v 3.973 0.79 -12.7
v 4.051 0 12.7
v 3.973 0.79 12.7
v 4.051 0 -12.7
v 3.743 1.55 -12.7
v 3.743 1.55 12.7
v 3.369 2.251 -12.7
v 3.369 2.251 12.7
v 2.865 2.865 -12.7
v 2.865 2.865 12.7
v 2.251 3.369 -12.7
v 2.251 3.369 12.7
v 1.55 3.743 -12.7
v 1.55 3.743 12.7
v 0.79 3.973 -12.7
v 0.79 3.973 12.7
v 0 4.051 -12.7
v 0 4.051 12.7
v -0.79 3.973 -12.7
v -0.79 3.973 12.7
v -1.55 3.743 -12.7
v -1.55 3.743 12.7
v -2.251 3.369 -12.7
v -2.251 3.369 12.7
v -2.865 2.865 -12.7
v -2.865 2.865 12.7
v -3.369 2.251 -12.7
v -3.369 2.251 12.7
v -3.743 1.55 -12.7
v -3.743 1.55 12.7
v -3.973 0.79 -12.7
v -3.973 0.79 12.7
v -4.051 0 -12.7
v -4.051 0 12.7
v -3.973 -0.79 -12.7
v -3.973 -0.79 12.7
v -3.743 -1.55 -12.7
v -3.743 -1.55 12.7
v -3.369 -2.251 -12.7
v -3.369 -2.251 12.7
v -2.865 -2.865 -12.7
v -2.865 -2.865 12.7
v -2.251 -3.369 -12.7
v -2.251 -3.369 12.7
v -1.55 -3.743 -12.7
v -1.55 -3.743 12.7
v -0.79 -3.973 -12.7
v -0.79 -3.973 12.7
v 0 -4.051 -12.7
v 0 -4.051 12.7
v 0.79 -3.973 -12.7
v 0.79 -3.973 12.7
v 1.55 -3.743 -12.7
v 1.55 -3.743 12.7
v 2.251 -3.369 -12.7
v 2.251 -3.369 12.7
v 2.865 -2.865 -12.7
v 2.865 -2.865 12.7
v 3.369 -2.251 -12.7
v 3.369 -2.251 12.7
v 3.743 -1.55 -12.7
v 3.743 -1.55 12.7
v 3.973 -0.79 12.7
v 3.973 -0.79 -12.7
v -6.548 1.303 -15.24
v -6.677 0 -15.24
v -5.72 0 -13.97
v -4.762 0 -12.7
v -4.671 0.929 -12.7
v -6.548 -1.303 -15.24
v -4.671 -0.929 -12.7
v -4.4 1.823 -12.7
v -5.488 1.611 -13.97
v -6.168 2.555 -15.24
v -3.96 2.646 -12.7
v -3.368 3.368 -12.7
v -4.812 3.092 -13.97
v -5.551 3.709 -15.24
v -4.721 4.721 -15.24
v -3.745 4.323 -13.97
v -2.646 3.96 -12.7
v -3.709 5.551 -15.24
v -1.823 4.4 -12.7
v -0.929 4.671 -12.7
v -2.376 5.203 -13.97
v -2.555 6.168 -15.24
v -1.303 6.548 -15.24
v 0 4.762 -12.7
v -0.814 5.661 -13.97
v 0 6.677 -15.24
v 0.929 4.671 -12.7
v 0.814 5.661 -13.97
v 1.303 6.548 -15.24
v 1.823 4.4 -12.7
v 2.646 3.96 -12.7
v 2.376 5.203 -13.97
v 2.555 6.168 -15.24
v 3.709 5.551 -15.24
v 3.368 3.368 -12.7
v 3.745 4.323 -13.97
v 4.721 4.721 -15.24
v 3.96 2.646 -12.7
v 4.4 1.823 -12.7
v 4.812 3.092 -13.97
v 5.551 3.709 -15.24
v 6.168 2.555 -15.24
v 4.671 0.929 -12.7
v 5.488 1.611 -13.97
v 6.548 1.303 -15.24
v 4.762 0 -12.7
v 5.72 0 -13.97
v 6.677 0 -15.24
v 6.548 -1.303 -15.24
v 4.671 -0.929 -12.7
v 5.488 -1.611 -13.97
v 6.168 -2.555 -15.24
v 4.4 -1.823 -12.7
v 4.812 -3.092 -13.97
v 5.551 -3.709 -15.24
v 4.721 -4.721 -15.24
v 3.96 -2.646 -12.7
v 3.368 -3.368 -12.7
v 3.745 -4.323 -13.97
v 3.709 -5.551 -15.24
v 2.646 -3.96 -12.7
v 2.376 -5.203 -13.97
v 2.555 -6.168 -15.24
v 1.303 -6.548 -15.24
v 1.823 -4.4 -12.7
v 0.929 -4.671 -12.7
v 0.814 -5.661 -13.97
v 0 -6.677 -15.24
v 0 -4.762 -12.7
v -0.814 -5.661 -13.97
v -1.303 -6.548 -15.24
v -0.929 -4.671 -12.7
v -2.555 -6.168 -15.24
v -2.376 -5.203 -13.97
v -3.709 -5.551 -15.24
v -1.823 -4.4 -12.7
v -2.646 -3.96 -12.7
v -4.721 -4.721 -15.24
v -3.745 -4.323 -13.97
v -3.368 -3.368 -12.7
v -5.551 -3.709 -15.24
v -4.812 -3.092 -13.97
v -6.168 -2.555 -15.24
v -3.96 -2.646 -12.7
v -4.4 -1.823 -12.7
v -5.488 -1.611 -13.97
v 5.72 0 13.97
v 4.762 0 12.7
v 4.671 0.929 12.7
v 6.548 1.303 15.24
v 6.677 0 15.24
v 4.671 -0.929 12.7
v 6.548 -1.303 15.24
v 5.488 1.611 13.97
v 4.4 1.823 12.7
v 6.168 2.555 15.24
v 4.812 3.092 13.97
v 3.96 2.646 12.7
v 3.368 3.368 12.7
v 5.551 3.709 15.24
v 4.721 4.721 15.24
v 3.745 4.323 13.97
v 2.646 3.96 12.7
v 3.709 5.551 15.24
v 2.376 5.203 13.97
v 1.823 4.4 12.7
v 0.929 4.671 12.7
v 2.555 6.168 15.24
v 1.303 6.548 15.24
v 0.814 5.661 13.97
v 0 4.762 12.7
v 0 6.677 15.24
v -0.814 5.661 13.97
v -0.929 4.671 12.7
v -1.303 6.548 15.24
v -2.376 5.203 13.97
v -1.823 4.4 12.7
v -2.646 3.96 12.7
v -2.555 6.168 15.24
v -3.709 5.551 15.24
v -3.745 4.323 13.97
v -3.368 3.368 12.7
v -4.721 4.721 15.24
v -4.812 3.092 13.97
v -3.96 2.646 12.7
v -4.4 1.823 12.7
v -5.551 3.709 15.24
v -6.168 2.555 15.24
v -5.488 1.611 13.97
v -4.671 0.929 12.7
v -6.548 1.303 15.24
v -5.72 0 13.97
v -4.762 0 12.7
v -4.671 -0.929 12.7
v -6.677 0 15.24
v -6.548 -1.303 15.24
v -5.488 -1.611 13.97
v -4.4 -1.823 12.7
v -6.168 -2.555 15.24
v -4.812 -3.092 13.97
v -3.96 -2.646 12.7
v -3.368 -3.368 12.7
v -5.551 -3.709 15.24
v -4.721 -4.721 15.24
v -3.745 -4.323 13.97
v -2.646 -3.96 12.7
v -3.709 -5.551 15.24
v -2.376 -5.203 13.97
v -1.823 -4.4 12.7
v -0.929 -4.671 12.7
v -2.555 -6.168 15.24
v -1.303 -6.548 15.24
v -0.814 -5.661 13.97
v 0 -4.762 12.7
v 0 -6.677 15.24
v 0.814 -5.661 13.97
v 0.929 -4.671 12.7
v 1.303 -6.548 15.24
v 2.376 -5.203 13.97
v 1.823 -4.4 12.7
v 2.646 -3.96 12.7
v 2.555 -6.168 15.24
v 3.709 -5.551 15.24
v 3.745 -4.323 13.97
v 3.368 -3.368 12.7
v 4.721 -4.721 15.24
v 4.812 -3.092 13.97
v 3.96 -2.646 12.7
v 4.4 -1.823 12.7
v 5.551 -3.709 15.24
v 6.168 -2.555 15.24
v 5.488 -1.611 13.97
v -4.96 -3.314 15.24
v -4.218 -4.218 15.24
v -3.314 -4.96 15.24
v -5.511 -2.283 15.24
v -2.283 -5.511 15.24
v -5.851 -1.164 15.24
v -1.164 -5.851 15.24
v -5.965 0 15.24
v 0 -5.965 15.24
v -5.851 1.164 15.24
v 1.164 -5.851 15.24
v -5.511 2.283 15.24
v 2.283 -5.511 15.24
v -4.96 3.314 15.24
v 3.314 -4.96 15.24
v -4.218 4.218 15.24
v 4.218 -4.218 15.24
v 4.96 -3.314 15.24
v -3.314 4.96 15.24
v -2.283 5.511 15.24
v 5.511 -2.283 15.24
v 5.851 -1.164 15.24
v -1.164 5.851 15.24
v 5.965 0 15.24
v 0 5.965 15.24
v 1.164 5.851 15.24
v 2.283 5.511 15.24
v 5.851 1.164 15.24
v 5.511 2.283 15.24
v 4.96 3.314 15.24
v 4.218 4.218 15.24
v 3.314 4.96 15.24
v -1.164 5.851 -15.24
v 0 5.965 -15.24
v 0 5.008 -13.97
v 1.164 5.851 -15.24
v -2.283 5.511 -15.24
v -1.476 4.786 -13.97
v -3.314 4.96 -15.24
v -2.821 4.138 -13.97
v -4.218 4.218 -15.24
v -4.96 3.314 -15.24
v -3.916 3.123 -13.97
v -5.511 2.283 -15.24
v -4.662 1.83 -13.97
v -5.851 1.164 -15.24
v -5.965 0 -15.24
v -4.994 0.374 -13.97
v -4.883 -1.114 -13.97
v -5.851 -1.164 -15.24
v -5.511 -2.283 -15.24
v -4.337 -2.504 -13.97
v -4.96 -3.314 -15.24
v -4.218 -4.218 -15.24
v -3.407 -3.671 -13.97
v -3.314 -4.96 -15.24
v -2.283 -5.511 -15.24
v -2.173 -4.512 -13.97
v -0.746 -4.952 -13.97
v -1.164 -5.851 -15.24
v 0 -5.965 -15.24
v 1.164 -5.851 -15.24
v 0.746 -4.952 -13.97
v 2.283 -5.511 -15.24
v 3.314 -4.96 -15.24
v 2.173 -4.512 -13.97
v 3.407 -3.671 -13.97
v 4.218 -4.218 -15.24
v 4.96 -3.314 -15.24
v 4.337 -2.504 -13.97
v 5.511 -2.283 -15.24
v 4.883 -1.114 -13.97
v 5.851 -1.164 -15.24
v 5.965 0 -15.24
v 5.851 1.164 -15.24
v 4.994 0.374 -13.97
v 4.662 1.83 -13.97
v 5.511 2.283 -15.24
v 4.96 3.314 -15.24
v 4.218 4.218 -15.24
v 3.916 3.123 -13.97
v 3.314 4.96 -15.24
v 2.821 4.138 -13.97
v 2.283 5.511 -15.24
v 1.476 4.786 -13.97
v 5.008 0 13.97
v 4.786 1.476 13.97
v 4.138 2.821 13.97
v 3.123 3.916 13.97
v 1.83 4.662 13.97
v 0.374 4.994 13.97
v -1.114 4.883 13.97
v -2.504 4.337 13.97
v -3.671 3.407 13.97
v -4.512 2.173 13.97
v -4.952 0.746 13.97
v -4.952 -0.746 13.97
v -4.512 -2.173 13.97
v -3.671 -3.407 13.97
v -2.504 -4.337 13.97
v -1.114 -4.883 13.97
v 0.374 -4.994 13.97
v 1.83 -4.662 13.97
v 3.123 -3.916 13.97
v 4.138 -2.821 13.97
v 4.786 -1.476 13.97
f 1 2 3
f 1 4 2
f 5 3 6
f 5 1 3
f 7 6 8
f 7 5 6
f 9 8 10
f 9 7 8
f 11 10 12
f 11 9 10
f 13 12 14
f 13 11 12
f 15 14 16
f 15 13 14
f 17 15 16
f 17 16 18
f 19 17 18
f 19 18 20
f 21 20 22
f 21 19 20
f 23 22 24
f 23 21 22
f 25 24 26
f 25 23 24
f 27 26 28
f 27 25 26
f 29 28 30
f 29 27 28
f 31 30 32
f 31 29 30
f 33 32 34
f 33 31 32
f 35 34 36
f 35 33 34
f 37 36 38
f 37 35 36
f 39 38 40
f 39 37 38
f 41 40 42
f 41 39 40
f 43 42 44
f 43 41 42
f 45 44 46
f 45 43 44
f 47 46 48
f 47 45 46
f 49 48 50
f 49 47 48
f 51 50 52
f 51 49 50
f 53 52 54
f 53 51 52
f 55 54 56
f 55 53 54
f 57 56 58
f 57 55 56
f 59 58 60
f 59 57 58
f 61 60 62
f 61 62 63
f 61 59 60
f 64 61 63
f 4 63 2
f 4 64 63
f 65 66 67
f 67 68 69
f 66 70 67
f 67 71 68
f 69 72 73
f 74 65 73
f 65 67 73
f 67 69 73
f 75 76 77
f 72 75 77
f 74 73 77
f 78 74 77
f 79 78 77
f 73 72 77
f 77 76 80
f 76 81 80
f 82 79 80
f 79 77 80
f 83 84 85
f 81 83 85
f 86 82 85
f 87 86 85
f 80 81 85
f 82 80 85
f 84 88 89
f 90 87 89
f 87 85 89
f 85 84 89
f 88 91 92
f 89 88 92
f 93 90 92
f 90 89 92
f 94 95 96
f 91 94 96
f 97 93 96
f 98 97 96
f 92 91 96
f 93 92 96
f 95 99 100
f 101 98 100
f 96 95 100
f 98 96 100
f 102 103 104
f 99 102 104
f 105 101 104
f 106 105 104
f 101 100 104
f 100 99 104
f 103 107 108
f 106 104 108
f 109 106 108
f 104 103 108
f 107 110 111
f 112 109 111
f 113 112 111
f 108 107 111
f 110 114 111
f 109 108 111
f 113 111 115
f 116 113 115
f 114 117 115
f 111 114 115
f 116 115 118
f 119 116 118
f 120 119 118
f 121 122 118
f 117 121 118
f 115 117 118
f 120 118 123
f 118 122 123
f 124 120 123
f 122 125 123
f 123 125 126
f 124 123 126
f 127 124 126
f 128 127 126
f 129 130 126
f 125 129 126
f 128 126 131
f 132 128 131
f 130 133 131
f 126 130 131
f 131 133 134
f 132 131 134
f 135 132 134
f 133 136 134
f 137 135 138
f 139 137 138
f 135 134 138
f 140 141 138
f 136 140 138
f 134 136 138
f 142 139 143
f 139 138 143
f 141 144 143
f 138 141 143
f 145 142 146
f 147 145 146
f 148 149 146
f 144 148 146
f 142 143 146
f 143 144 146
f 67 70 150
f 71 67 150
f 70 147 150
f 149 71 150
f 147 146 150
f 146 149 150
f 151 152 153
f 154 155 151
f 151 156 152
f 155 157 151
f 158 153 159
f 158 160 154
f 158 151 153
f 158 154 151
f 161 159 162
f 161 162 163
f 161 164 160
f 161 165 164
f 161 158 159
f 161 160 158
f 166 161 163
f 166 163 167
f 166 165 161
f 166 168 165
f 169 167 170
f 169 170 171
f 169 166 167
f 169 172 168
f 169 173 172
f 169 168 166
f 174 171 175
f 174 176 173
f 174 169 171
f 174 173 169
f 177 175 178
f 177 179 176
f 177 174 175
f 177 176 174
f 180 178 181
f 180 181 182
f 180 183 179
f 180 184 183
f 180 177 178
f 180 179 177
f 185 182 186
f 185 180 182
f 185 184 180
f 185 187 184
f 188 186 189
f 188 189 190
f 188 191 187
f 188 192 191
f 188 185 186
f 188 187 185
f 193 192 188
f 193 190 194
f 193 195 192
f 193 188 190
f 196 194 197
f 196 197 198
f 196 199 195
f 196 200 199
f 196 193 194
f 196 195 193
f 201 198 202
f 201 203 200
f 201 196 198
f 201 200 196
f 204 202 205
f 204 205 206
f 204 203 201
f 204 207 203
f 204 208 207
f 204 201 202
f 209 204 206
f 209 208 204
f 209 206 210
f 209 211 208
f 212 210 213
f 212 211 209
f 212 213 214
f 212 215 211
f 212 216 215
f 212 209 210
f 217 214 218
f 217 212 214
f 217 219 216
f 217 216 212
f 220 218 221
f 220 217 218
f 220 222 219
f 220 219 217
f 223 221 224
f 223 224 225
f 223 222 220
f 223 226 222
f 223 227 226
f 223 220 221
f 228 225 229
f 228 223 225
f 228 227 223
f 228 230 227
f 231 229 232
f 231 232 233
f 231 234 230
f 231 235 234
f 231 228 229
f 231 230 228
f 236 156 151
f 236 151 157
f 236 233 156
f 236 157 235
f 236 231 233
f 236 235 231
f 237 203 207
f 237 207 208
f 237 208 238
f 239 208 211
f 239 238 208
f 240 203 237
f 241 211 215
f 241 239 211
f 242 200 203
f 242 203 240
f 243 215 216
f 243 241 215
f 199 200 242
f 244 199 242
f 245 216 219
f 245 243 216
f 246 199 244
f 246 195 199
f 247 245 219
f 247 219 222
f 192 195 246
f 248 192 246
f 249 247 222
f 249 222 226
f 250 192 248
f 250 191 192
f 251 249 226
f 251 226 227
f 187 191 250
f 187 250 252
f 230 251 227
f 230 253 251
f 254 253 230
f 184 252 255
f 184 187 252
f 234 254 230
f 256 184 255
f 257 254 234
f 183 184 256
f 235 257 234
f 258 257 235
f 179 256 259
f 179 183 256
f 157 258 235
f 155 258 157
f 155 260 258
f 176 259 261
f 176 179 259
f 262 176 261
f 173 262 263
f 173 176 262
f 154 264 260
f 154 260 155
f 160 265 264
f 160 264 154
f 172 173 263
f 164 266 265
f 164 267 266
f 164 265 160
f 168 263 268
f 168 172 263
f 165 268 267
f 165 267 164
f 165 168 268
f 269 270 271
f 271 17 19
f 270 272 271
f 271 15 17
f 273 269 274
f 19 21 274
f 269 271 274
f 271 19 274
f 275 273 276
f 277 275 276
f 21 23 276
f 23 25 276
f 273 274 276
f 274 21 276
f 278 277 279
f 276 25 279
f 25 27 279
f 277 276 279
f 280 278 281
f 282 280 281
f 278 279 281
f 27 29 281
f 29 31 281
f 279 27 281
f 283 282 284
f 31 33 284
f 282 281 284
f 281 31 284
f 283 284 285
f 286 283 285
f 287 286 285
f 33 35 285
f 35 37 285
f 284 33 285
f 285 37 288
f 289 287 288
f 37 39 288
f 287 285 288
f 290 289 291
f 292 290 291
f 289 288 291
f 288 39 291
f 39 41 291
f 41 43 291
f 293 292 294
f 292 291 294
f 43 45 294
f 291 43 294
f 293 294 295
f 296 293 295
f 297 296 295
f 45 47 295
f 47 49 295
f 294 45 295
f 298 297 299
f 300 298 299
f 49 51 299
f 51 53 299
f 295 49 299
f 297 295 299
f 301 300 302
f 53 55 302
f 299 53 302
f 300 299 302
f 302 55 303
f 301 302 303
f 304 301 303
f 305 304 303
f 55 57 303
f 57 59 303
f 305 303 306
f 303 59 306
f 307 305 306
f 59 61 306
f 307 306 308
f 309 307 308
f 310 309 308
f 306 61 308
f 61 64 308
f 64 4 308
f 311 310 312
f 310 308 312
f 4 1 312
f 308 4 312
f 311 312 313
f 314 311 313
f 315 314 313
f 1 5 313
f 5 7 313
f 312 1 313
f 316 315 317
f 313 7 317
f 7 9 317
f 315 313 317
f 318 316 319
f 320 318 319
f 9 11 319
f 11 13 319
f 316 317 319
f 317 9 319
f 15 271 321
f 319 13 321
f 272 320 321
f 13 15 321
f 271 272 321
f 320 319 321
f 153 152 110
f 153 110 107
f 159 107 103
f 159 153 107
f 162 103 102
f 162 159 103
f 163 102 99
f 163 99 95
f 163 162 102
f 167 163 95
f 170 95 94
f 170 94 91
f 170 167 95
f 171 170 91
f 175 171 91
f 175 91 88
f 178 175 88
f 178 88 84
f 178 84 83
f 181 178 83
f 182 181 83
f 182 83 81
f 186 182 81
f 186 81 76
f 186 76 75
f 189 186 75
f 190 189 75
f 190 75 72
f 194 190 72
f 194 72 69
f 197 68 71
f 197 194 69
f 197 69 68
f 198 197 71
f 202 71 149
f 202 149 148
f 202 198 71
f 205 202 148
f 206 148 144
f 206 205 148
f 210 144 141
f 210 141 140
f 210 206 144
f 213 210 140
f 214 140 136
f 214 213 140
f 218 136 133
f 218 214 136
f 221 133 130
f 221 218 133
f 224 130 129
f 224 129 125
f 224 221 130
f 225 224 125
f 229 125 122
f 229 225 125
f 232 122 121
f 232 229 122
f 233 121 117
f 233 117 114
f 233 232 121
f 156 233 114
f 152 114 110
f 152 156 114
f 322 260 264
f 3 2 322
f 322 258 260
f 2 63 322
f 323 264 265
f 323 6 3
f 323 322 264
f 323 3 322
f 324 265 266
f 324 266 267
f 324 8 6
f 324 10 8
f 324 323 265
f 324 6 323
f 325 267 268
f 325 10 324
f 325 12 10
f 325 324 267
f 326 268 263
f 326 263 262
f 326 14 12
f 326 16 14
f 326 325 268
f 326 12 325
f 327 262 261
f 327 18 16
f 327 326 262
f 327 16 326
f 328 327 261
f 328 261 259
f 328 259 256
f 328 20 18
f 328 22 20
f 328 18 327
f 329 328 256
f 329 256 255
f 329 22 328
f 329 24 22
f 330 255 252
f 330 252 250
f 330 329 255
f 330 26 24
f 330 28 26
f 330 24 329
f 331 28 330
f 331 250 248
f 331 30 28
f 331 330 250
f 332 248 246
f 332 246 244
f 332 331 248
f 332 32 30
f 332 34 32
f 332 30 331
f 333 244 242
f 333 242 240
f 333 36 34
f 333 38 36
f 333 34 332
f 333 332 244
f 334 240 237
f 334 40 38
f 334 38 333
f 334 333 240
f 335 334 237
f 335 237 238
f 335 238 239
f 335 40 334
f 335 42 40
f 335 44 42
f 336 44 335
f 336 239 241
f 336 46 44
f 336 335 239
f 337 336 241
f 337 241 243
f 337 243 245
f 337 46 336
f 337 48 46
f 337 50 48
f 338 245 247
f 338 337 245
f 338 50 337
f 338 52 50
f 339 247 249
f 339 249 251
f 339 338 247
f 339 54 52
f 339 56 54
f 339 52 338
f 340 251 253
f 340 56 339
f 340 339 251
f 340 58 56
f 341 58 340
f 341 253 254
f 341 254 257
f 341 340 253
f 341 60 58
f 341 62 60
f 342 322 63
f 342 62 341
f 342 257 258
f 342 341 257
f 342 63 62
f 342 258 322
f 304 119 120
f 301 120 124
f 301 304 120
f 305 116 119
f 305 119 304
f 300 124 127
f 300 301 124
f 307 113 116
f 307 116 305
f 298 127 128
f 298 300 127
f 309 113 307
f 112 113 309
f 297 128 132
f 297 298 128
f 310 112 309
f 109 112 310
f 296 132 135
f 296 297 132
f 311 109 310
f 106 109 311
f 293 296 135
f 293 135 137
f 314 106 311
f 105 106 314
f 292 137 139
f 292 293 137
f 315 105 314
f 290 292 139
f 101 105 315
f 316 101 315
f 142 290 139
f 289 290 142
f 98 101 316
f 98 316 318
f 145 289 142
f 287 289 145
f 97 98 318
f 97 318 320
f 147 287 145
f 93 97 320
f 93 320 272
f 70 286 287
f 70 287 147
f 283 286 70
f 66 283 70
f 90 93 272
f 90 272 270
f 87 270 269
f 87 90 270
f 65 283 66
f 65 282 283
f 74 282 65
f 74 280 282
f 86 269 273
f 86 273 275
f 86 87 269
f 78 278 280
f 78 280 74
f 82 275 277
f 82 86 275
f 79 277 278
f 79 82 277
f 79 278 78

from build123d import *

# Parameters (mm, degrees)
SKETCH2_R           = 4.7625
SKETCH2_R_2         = 4.0513
BOSS_EXTRUDE1_DEPTH = 12.7
SKETCH4_R           = 4.7625
BOSS_EXTRUDE2_DEPTH = 2.54
BOSS_EXTRUDE2_TAPER = -37


with BuildPart() as part:
    # Sketch2 → Boss-Extrude1 (new, symmetric)
    with BuildSketch(Plane.XY):
        Circle(SKETCH2_R)
        Circle(SKETCH2_R_2, mode=Mode.SUBTRACT)
    extrude(amount=BOSS_EXTRUDE1_DEPTH, both=True)

    # Sketch4 → Boss-Extrude2 (add)
    with BuildSketch(Plane(origin=(0, 0, -12.7), x_dir=(-1, 0, 0), z_dir=(0, 0, -1))):
        Circle(SKETCH4_R)
    boss_extrude2 = extrude(amount=BOSS_EXTRUDE2_DEPTH, taper=BOSS_EXTRUDE2_TAPER)

    # Cut-Extrude2 cone 1 section (through the dimple's axis) → Cut-Extrude2 (revolve, cut)
    with BuildSketch(Plane(origin=(0, 0, -15.24), x_dir=(0, 1, 0), z_dir=(1, 0, 0))):
        Polygon((0, 0), (5.965327287, 0), (0, 7.916256686), align=None)
    cut_extrude2 = revolve(axis=Axis((0, 0, -15.24), (0, 0, 1)), mode=Mode.SUBTRACT)

    # Mirror1: Boss-Extrude2, Cut-Extrude2 across plane
    add(boss_extrude2.mirror(Plane.XY))
    add(cut_extrude2.mirror(Plane.XY), mode=Mode.SUBTRACT)


solid = part.part
